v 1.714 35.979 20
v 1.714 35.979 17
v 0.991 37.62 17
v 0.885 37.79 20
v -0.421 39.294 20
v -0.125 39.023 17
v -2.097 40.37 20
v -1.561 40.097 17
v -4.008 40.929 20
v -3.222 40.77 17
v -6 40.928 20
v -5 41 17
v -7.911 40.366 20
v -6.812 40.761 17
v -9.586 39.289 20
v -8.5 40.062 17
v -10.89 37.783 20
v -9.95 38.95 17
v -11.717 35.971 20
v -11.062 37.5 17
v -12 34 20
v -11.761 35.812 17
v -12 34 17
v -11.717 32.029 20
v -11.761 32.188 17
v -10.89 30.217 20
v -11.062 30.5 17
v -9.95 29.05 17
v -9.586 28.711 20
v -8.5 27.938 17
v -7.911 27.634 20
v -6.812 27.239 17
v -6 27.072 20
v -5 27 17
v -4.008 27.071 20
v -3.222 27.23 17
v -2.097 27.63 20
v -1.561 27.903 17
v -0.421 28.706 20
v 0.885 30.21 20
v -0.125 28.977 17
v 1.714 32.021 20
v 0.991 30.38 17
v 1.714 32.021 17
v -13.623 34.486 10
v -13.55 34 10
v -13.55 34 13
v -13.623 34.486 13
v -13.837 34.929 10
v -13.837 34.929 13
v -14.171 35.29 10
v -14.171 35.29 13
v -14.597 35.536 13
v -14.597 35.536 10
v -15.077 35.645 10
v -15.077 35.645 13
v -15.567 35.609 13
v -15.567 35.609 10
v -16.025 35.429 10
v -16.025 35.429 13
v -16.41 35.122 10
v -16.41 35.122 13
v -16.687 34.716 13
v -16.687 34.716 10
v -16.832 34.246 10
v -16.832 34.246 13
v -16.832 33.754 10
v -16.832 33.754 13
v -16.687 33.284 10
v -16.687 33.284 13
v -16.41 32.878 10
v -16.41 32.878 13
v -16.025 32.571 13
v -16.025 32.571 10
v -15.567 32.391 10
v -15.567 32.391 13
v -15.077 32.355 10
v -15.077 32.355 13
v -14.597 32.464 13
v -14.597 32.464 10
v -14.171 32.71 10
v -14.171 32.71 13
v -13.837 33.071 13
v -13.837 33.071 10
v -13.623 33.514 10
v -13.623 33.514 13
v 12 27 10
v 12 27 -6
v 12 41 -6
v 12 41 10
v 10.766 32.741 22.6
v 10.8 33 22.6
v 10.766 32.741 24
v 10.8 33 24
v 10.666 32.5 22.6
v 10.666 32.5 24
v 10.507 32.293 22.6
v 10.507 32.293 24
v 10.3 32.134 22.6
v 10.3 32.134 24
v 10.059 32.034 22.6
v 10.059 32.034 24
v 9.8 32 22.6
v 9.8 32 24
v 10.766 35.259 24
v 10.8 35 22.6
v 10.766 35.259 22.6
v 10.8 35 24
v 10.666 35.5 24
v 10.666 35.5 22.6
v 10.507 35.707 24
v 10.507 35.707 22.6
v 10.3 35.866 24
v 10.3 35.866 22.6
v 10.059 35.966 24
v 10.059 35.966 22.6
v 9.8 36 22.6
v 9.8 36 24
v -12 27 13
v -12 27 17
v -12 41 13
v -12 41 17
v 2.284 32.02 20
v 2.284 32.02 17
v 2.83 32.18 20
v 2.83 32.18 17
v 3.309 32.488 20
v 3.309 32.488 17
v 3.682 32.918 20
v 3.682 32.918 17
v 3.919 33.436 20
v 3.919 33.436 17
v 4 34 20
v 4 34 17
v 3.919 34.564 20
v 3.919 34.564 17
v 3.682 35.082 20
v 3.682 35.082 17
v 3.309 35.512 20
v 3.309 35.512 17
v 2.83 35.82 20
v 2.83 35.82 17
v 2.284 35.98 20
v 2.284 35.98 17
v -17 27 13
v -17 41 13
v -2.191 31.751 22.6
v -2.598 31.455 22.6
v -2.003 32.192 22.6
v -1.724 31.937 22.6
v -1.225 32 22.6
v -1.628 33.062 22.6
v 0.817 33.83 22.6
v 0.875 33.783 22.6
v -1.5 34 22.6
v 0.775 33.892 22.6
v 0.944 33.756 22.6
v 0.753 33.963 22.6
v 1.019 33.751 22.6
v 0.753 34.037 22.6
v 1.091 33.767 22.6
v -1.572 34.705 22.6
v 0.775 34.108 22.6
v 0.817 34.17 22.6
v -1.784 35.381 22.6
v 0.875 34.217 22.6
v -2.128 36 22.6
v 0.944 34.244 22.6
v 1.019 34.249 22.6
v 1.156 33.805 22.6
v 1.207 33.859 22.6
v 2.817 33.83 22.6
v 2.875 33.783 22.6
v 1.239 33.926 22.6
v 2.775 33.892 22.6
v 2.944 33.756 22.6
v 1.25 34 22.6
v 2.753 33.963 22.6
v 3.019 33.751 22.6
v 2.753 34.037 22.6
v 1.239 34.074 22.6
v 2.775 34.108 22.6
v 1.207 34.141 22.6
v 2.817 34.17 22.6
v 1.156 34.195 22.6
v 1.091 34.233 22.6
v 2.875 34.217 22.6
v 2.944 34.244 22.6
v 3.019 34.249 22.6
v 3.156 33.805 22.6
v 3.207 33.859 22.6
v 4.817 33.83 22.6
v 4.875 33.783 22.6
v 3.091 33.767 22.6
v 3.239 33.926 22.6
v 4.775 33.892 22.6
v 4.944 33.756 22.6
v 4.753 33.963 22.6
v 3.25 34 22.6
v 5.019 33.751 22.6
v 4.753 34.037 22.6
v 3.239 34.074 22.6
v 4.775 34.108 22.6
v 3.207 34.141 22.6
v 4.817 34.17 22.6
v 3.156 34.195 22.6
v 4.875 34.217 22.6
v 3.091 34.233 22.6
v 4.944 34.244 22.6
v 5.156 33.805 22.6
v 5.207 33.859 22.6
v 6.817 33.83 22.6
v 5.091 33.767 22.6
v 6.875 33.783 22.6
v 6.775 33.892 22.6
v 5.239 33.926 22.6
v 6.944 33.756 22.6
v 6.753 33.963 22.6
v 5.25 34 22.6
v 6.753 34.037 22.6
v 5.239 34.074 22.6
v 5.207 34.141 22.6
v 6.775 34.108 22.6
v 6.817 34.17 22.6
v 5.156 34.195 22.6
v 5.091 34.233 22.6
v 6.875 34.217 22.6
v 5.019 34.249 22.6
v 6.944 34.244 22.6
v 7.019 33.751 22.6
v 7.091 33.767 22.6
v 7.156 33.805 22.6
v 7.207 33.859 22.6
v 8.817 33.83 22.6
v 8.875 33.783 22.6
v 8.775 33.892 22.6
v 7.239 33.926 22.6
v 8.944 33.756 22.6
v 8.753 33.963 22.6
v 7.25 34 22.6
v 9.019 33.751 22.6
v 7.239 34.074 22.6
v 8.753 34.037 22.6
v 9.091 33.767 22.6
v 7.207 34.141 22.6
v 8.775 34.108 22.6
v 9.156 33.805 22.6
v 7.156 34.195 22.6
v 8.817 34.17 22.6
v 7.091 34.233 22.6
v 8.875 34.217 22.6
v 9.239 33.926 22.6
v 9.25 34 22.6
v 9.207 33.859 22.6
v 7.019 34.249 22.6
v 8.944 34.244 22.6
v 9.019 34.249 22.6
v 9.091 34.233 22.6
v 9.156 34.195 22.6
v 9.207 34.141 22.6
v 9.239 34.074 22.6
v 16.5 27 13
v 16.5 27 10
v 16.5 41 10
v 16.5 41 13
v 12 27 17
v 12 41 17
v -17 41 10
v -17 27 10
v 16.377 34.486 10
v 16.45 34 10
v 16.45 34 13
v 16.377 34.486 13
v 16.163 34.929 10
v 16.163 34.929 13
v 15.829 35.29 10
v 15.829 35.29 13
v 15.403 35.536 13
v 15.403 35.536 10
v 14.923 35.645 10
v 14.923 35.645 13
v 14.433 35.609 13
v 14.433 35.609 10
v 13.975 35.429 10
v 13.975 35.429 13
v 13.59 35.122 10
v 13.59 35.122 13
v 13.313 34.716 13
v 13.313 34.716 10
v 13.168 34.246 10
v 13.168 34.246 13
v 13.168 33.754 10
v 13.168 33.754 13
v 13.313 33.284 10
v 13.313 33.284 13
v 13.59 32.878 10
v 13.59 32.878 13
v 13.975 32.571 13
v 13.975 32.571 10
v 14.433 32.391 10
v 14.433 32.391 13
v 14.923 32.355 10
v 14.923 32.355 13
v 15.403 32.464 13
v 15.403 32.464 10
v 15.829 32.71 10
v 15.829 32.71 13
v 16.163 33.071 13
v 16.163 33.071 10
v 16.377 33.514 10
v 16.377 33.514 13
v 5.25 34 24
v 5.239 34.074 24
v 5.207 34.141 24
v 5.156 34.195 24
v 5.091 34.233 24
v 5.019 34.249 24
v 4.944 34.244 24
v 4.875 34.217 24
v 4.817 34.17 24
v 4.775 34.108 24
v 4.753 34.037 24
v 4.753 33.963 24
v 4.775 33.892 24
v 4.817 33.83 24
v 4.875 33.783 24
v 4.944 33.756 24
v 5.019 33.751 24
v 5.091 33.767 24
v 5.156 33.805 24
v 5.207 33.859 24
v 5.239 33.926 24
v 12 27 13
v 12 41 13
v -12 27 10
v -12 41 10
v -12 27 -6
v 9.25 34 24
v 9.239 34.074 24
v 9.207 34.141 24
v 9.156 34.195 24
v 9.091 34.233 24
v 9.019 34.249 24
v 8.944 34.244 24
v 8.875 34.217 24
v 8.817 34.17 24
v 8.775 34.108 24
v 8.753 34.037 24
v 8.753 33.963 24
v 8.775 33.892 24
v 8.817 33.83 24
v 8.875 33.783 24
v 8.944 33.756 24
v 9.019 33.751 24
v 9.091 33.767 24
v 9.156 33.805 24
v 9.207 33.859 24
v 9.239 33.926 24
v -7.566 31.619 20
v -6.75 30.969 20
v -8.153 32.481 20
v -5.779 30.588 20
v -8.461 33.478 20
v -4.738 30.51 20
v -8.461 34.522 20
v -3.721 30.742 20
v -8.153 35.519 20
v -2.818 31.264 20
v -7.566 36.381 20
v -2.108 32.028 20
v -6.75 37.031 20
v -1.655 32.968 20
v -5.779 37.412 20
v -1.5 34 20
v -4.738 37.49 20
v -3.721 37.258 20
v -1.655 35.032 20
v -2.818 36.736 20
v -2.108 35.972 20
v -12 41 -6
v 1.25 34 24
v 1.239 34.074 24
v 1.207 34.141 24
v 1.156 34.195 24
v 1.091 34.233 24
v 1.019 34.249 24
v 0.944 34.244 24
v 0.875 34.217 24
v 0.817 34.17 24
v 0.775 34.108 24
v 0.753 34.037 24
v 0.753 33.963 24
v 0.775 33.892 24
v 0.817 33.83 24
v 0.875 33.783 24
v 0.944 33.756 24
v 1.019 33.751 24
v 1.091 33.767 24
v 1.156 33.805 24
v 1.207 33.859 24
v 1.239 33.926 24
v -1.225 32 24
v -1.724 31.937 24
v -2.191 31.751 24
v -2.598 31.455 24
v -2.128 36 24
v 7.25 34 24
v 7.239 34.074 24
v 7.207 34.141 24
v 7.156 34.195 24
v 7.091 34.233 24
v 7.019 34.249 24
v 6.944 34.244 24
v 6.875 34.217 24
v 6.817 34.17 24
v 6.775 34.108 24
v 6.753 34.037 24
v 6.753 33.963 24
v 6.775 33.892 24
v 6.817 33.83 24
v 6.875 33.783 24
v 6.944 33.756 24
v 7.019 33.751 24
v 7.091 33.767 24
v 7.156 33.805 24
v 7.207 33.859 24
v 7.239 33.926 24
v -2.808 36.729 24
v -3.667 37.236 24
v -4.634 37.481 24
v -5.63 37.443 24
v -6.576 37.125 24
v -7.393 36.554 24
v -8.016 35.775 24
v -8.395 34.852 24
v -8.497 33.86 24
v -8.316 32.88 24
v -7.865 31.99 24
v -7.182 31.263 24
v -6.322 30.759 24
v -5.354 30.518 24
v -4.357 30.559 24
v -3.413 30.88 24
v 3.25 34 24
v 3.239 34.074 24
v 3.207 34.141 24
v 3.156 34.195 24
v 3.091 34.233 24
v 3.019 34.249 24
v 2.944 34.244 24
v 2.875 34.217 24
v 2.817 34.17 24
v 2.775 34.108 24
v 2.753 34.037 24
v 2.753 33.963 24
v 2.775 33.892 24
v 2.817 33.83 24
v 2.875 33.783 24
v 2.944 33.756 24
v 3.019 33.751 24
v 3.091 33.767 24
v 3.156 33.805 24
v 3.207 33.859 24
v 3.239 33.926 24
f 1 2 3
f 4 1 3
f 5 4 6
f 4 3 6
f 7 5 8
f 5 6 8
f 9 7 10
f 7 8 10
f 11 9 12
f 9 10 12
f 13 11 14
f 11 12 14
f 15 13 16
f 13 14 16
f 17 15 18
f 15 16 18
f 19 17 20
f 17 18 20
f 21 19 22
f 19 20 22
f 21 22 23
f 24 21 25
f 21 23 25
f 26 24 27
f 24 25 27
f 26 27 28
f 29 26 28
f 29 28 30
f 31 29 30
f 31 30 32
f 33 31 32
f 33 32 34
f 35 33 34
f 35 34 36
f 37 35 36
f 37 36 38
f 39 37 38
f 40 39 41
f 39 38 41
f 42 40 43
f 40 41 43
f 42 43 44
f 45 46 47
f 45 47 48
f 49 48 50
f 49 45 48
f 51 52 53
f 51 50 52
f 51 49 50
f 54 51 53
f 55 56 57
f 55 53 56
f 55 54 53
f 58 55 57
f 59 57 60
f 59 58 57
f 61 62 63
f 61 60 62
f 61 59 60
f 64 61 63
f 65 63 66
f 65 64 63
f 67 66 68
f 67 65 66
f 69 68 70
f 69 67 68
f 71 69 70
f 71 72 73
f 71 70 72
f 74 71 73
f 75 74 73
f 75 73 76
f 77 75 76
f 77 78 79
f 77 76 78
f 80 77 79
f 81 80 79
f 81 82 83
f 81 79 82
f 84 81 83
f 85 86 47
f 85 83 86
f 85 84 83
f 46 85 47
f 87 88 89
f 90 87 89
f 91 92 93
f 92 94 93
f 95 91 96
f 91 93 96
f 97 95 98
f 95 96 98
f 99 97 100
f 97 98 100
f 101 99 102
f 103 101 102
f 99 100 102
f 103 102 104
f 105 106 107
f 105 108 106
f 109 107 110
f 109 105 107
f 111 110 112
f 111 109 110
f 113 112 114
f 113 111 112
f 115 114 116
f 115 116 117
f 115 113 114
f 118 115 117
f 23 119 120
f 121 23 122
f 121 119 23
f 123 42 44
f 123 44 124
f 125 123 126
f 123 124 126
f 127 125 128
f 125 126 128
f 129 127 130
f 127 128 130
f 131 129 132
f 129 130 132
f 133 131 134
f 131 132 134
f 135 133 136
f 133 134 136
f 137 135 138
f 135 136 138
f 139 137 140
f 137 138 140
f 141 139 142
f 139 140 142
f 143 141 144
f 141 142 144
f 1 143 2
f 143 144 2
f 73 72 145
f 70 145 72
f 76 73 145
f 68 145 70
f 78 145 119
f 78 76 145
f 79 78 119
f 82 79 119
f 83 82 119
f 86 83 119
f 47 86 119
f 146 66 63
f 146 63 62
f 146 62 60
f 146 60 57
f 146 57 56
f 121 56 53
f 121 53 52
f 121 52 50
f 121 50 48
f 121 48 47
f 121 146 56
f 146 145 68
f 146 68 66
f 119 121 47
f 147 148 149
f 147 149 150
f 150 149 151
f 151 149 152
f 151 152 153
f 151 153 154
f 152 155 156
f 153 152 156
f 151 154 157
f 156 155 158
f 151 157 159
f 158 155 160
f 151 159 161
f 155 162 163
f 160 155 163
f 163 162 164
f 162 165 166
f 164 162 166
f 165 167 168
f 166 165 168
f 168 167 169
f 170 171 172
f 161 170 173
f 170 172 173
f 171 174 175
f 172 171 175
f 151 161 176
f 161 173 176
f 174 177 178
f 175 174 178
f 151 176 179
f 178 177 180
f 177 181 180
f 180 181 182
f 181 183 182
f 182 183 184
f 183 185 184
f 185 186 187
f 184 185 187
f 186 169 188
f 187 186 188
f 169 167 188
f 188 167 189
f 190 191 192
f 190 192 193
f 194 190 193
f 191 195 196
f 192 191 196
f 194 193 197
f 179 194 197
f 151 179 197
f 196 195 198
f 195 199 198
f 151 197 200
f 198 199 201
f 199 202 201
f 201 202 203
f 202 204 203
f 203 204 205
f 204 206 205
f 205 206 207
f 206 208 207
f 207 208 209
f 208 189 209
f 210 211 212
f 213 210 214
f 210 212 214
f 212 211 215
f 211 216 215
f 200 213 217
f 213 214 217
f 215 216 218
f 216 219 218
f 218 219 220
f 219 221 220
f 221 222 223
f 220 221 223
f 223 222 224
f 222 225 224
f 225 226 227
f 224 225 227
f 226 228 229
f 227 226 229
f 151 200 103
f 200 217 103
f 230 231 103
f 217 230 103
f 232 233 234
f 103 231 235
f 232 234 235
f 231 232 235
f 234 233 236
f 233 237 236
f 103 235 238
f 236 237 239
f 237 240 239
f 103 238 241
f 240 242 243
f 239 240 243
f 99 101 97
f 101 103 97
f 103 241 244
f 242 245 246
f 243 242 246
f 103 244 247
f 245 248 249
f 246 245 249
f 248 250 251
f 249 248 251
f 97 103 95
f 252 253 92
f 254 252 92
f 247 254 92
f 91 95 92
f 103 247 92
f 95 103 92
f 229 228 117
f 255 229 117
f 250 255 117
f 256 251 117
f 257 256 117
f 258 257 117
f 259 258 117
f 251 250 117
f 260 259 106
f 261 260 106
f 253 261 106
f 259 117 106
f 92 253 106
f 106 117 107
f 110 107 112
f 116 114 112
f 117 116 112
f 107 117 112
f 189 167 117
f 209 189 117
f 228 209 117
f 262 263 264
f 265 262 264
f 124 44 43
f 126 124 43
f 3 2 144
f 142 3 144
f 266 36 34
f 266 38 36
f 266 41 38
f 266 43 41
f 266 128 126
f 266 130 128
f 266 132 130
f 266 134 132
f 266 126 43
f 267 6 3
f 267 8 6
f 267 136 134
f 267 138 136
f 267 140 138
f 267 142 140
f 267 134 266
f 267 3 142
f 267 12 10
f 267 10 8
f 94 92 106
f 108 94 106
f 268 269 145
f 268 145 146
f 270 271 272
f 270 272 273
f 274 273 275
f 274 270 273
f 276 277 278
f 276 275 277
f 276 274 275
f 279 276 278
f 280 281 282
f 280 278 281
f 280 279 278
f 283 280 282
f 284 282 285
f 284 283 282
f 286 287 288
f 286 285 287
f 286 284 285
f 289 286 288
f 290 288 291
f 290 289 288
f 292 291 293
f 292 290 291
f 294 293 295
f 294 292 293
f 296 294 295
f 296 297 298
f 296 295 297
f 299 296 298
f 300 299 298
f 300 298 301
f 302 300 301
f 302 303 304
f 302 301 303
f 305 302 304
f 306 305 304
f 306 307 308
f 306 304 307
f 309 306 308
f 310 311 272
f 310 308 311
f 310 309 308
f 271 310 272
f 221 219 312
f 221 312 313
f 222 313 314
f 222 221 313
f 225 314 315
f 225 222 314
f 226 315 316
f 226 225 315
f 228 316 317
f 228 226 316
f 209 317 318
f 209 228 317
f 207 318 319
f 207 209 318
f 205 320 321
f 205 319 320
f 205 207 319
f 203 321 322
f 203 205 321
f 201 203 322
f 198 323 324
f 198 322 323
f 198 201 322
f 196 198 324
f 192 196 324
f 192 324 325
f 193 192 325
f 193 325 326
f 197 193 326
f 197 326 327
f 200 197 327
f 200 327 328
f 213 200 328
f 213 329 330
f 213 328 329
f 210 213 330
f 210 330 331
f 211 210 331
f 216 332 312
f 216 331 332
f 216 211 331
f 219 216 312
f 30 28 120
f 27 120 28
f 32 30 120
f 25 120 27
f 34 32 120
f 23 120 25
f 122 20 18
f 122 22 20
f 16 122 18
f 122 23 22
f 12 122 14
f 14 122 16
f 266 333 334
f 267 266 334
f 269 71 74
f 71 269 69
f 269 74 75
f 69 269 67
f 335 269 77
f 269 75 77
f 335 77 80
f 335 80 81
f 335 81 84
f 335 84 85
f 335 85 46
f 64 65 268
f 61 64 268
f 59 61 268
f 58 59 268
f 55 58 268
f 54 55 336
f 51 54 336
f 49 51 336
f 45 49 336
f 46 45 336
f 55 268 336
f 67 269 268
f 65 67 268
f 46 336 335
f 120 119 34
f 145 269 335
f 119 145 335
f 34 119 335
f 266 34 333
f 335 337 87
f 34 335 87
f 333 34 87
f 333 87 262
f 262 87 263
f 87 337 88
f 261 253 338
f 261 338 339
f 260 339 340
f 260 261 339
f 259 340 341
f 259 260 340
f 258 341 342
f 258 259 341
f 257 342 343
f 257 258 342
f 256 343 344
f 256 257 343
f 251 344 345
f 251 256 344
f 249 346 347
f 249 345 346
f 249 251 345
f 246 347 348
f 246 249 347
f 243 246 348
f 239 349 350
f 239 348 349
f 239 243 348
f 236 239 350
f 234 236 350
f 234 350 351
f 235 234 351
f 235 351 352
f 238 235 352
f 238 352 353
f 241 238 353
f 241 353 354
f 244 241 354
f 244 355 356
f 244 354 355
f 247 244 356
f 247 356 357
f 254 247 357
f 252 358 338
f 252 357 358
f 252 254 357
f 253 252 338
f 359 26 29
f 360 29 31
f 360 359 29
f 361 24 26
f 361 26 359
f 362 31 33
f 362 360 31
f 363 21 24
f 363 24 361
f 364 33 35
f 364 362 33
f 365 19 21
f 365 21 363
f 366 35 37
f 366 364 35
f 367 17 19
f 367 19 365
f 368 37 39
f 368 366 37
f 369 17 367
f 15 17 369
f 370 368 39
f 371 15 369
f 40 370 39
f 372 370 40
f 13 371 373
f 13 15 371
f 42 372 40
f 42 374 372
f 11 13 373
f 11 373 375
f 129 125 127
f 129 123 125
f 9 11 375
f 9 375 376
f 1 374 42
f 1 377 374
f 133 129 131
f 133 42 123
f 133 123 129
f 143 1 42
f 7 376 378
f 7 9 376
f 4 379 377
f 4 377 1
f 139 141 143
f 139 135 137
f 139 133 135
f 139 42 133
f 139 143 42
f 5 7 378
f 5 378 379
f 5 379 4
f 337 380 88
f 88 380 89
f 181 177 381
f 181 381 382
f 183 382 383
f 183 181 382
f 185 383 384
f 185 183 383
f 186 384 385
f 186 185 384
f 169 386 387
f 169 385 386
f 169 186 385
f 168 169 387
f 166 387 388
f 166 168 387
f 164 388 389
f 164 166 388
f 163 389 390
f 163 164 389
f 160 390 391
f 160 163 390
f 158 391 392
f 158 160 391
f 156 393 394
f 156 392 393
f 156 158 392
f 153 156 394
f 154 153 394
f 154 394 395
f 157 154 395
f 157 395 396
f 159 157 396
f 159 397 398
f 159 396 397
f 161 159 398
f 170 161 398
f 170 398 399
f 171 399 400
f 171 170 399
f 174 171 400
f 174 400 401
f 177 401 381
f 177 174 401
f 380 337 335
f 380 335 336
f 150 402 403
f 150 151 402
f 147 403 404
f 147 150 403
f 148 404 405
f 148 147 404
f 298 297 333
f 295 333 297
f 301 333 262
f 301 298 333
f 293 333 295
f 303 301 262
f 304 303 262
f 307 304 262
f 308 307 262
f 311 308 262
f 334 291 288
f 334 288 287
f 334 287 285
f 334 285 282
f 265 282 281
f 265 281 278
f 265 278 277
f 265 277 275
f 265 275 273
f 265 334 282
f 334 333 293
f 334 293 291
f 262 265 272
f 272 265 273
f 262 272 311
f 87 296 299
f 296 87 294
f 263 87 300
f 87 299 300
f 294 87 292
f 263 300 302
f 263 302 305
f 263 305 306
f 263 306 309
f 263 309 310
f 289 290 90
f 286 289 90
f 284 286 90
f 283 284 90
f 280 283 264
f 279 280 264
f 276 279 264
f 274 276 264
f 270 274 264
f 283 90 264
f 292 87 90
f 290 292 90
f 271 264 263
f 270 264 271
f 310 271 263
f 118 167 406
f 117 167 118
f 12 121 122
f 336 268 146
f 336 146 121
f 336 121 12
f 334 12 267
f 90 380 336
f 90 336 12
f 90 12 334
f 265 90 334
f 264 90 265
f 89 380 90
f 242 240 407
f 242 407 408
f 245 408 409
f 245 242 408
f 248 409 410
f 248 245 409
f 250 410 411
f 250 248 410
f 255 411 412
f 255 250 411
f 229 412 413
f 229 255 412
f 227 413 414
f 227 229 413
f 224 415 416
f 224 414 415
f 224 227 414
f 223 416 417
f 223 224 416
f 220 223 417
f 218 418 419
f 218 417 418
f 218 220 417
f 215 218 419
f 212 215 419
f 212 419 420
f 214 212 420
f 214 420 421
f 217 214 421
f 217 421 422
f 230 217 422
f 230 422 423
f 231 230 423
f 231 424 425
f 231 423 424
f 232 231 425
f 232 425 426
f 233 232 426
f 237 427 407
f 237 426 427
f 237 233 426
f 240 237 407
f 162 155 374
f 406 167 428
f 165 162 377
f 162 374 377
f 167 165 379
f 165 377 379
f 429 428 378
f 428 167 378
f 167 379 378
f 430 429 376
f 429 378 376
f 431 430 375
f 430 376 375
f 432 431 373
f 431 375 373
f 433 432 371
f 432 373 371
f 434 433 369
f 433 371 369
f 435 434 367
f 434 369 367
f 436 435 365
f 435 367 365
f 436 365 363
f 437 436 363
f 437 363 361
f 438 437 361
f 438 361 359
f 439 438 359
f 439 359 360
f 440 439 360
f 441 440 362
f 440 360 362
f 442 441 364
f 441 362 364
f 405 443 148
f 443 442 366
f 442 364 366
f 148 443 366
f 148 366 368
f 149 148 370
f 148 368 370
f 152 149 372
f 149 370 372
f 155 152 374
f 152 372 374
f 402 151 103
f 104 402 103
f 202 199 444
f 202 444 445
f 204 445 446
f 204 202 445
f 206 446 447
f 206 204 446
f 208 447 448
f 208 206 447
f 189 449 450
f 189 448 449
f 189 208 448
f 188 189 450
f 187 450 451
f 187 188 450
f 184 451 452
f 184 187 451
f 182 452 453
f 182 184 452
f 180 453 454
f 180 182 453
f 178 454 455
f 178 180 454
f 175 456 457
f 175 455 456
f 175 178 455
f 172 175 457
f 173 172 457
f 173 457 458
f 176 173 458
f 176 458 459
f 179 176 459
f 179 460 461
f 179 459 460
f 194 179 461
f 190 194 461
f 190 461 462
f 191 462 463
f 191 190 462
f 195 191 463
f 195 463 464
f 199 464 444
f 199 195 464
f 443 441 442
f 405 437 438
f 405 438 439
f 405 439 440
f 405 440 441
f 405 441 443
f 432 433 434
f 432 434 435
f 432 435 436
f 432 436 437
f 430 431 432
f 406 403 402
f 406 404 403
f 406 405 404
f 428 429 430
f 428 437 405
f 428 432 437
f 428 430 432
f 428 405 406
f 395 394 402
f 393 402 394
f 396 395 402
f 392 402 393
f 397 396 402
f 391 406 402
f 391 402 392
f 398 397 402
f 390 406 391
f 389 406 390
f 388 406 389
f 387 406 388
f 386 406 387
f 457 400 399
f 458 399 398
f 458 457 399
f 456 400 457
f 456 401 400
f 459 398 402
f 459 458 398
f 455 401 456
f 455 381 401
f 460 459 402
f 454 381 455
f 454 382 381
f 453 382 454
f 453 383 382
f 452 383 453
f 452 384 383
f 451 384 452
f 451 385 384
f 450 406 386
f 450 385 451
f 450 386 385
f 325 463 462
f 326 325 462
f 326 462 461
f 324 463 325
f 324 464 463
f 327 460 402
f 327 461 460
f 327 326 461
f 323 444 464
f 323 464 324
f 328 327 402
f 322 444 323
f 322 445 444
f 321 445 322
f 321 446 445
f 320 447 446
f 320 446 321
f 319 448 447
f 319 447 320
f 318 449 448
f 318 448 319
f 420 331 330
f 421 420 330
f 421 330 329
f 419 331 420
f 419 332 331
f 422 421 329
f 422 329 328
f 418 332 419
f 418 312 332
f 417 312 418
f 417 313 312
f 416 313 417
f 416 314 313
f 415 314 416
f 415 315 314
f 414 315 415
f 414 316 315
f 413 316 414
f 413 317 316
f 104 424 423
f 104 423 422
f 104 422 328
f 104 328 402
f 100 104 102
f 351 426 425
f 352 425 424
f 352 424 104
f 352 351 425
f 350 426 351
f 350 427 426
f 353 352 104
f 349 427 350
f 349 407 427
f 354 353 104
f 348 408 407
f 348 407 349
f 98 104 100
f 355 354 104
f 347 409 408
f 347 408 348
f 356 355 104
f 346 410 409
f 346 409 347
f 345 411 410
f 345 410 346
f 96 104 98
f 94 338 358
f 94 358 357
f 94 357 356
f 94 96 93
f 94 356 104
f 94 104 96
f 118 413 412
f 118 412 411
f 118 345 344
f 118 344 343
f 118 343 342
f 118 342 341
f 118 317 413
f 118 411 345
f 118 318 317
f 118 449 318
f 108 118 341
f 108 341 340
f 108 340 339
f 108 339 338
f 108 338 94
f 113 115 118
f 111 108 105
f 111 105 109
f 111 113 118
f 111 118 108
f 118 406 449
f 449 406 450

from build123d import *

# Parameters (mm, degrees)
CYLINDER067_R     = 0.25
CYLINDER067_DEPTH = 10
CYLINDER068_R     = 0.25
CYLINDER068_DEPTH = 10
CYLINDER069_R     = 0.25
CYLINDER069_DEPTH = 10
CYLINDER070_R     = 0.25
CYLINDER070_DEPTH = 10
CYLINDER066_R     = 0.25
CYLINDER066_DEPTH = 10
BOX094_W          = 13
BOX094_H          = 4
BOX094_DEPTH      = 1.4
CYLINDER065_R     = 3.5
CYLINDER065_DEPTH = 4
FILLET027_R       = 2
FILLET030_R       = 1
FILLET031_R       = 1
CYLINDER064_R     = 1.65
CYLINDER064_DEPTH = 10
CYLINDER063_R     = 1.65
CYLINDER063_DEPTH = 10
BOX093_W          = 33.5
BOX093_H          = 14
BOX093_DEPTH      = 3
CYLINDER062_R     = 2
CYLINDER062_DEPTH = 3
CYLINDER061_R     = 7
CYLINDER061_DEPTH = 3
BOX092_W          = 24
BOX092_H          = 14
BOX092_DEPTH      = 23


with BuildPart() as cilindro067:
    # Cylinder067 → Cylinder067 (new body)
    with BuildSketch(Plane(origin=(19, 7, 25), x_dir=(1, 0, 0), z_dir=(0, 0, 1))):
        Circle(CYLINDER067_R)
    extrude(amount=CYLINDER067_DEPTH)


with BuildPart() as cilindro068:
    # Cylinder068 → Cylinder068 (new body)
    with BuildSketch(Plane(origin=(17, 7, 25), x_dir=(1, 0, 0), z_dir=(0, 0, 1))):
        Circle(CYLINDER068_R)
    extrude(amount=CYLINDER068_DEPTH)


with BuildPart() as cilindro069:
    # Cylinder069 → Cylinder069 (new body)
    with BuildSketch(Plane(origin=(15, 7, 27), x_dir=(1, 0, 0), z_dir=(0, 0, 1))):
        Circle(CYLINDER069_R)
    extrude(amount=CYLINDER069_DEPTH)


with BuildPart() as cilindro070:
    # Cylinder070 → Cylinder070 (new body)
    with BuildSketch(Plane(origin=(13, 7, 27), x_dir=(1, 0, 0), z_dir=(0, 0, 1))):
        Circle(CYLINDER070_R)
    extrude(amount=CYLINDER070_DEPTH)


with BuildPart() as cilindro066:
    # Cylinder066 → Cylinder066 (new body)
    with BuildSketch(Plane(origin=(21, 7, 25), x_dir=(1, 0, 0), z_dir=(0, 0, 1))):
        Circle(CYLINDER066_R)
    extrude(amount=CYLINDER066_DEPTH)


with BuildPart() as cubo094:
    # Box094 → Box094 (new body)
    with BuildSketch(Plane(origin=(9.8, 5, 28.6), x_dir=(1, 0, 0), z_dir=(0, 0, 1))):
        with Locations((6.5, 2)):
            Rectangle(BOX094_W, BOX094_H)
    extrude(amount=BOX094_DEPTH)


with BuildPart() as fillet031:
    # Cylinder065 → Cylinder065 (new body)
    with BuildSketch(Plane(origin=(7, 7, 26), x_dir=(1, 0, 0), z_dir=(0, 0, 1))):
        Circle(CYLINDER065_R)
    extrude(amount=CYLINDER065_DEPTH)

    # Fusion067: union Cubo094
    add(cubo094.part)

    # Fillet027
    fillet027_edges = [fillet031.edges().sort_by_distance(p)[0] for p in [
        (9.872281, 5, 29.3),
    ]]
    fillet(fillet027_edges, radius=FILLET027_R)

    # Fillet030
    fillet030_edges = [fillet031.edges().sort_by_distance(p)[0] for p in [
        (22.8, 5, 29.3),
    ]]
    fillet(fillet030_edges, radius=FILLET030_R)

    # Fillet031
    fillet031_edges = [fillet031.edges().sort_by_distance(p)[0] for p in [
        (22.8, 9, 29.3),
    ]]
    fillet(fillet031_edges, radius=FILLET031_R)


with BuildPart() as cilindro064:
    # Cylinder064 → Cylinder064 (new body)
    with BuildSketch(Plane(origin=(26.8, 7, 12), x_dir=(1, 0, 0), z_dir=(0, 0, 1))):
        Circle(CYLINDER064_R)
    extrude(amount=CYLINDER064_DEPTH)


with BuildPart() as cilindro063:
    # Cylinder063 → Cylinder063 (new body)
    with BuildSketch(Plane(origin=(-3.2, 7, 12), x_dir=(1, 0, 0), z_dir=(0, 0, 1))):
        Circle(CYLINDER063_R)
    extrude(amount=CYLINDER063_DEPTH)


with BuildPart() as cubo093:
    # Box093 → Box093 (new body)
    with BuildSketch(Plane(origin=(-5, 0, 16), x_dir=(1, 0, 0), z_dir=(0, 0, 1))):
        with Locations((16.75, 7)):
            Rectangle(BOX093_W, BOX093_H)
    extrude(amount=BOX093_DEPTH)


with BuildPart() as cilindro062:
    # Cylinder062 → Cylinder062 (new body)
    with BuildSketch(Plane(origin=(14, 7, 23), x_dir=(1, 0, 0), z_dir=(0, 0, 1))):
        Circle(CYLINDER062_R)
    extrude(amount=CYLINDER062_DEPTH)


with BuildPart() as fusion064:
    # Cylinder061 → Cylinder061 (new body)
    with BuildSketch(Plane(origin=(7, 7, 23), x_dir=(1, 0, 0), z_dir=(0, 0, 1))):
        Circle(CYLINDER061_R)
    extrude(amount=CYLINDER061_DEPTH)

    # Fusion064: union Cilindro062
    add(cilindro062.part)


with BuildPart() as servo006:
    # Box092 → Box092 (new body)
    with BuildSketch(Plane.XY):
        with Locations((12, 7)):
            Rectangle(BOX092_W, BOX092_H)
    extrude(amount=BOX092_DEPTH)

    # Fusion065: union Fusion064
    add(fusion064.part)

    # Fusion066: union Cubo093
    add(cubo093.part)

    # Cut086: cut Cilindro063
    add(cilindro063.part, mode=Mode.SUBTRACT)

    # Cut087: cut Cilindro064
    add(cilindro064.part, mode=Mode.SUBTRACT)

    # Fusion068: union Fillet031
    add(fillet031.part)

    # Cut088: cut Cilindro066
    add(cilindro066.part, mode=Mode.SUBTRACT)

    # Cut089: cut Cilindro070
    add(cilindro070.part, mode=Mode.SUBTRACT)

    # Cut090: cut Cilindro069
    add(cilindro069.part, mode=Mode.SUBTRACT)

    # Cut091: cut Cilindro068
    add(cilindro068.part, mode=Mode.SUBTRACT)

    # Cut092: cut Cilindro067
    add(cilindro067.part, mode=Mode.SUBTRACT)


with BuildPart() as servo006_1:
    # Cut092 placement: moved
    add(servo006.part.moved(Location((-12, 27, -6))))


solid = servo006_1.part
